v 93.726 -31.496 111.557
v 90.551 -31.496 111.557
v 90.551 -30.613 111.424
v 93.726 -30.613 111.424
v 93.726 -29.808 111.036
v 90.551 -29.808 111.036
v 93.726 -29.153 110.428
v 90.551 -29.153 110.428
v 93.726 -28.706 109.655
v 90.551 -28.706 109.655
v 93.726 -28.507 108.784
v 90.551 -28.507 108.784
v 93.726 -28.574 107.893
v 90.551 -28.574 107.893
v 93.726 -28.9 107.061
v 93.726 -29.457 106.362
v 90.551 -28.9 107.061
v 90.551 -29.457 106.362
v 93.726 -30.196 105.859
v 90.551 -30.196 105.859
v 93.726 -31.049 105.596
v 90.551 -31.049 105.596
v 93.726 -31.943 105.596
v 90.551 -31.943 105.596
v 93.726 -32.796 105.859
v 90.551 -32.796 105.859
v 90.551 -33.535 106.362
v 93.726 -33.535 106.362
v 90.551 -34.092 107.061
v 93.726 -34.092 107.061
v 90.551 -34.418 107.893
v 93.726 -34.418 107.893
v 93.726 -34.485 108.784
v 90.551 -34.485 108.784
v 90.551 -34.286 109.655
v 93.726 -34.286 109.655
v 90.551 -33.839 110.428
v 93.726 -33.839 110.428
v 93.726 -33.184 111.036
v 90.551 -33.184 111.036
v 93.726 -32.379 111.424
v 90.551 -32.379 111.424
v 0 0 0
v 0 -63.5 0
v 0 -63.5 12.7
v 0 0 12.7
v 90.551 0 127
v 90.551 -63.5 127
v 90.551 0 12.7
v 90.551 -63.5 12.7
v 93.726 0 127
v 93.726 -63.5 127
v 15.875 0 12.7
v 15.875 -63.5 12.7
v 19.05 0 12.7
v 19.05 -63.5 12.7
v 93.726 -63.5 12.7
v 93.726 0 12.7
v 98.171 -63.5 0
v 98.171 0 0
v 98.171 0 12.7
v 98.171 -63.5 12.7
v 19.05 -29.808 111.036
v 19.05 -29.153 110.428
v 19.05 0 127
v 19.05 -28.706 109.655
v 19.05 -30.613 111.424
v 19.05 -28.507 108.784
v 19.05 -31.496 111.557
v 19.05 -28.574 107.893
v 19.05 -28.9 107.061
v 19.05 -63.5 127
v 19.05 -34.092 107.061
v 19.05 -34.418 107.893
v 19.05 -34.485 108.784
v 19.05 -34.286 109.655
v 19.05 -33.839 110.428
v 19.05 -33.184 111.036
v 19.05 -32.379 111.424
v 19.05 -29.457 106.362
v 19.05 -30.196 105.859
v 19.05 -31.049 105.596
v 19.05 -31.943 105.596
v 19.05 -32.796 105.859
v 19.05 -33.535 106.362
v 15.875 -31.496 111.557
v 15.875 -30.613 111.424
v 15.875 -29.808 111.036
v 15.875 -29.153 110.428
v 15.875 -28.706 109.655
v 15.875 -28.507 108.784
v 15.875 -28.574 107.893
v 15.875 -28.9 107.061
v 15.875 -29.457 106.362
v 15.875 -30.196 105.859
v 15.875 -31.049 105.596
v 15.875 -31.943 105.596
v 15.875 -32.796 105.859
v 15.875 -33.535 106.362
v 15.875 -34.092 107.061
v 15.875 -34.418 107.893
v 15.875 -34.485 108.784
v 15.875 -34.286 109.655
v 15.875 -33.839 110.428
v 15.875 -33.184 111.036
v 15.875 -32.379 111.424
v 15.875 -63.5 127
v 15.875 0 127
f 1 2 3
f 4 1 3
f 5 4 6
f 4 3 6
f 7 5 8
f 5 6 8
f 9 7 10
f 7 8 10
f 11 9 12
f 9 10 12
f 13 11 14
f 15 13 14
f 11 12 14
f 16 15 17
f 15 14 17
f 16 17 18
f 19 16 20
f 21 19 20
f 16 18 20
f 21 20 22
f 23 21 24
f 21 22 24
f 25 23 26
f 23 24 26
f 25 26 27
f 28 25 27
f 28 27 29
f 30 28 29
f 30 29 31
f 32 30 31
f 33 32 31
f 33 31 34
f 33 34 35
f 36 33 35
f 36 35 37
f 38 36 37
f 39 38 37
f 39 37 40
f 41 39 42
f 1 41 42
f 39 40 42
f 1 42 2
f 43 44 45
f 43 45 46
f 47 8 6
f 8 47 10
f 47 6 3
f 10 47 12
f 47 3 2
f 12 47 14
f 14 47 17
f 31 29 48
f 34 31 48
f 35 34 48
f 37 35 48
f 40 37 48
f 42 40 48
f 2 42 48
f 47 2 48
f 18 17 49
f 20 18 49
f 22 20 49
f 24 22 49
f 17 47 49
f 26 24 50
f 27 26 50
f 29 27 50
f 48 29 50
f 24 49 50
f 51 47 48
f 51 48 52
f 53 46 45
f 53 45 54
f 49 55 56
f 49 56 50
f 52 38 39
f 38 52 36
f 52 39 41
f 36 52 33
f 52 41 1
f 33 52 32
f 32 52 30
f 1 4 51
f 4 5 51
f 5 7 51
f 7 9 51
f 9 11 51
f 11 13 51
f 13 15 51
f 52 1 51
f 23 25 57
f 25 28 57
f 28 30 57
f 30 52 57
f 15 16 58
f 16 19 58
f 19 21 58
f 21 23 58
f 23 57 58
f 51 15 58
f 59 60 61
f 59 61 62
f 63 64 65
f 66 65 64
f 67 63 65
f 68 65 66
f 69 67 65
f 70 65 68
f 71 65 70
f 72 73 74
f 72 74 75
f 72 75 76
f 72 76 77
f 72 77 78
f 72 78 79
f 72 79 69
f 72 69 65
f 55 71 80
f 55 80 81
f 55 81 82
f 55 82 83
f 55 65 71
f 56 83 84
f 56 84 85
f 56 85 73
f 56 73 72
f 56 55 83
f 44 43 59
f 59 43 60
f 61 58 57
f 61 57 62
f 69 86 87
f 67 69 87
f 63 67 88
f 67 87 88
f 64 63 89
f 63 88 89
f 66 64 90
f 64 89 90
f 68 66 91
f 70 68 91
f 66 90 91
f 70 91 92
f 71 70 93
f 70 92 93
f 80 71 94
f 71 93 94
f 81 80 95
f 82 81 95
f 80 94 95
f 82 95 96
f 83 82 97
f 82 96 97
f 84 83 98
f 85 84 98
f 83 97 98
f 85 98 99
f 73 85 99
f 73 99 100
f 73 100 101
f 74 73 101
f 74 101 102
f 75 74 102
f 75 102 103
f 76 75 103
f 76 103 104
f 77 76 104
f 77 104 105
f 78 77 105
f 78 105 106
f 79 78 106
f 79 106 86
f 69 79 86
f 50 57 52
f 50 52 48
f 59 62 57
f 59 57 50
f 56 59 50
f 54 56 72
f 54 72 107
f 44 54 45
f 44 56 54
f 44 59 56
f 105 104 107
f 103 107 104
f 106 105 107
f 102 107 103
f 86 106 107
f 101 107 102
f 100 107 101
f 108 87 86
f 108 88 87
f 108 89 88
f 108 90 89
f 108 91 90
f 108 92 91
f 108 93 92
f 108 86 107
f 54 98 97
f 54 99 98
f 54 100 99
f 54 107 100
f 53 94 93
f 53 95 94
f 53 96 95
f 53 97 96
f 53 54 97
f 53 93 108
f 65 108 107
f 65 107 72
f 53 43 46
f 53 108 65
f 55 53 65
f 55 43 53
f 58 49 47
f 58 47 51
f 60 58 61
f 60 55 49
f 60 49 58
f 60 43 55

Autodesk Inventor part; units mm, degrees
ref_plane "YZ Plane" through (0, 0, 0) normal (1, 0, 0) x (0, 1, 0)
ref_plane "XZ Plane" through (0, 0, 0) normal (0, 1, 0) x (-1, 0, 0)
ref_plane "XY Plane" through (0, 0, 0) normal (0, 0, 1) x (1, 0, 0)
sketch "Sketch1" plane through (0, 0, 0) normal (0, 0, 1) x (1, 0, 0)
  line L0 (0, 0) -> (98.171, 0)
  line L1 (98.171, 0) -> (98.171, -63.5)
  line L2 (98.171, -63.5) -> (0, -63.5)
  line L3 (0, -63.5) -> (0, 0)
  dimension "d0" = 98.171
  dimension "d1" = 63.5
extrude "Extrusion1" add sketch "Sketch1" along normal blind 12.7
sketch "Sketch2" plane through (0, 0, 12.7) normal (0, 0, 1) x (1, 0, 0)
  line L0 (0, -63.5) -> (98.171, -63.5) projected
  line L1 (98.171, -63.5) -> (90.551, -63.5)
  line L2 (90.551, -63.5) -> (93.726, -63.5)
  line L3 (93.726, -63.5) -> (93.726, 0)
  line L4 (93.726, 0) -> (90.551, 0)
  line L5 (90.551, 0) -> (90.551, -63.5)
  point P0 (0, 0)
  dimension "d4" = 7.62
  dimension "d5" = 3.175
extrude "Extrusion2" add sketch "Sketch2" along normal blind 114.3
sketch "Sketch3" plane through (0, 0, 12.7) normal (0, 0, 1) x (1, 0, 0)
  line L0 (0, 0) -> (15.875, 0)
  line L1 (90.551, 0) -> (0, 0) projected
  line L2 (0, -63.5) -> (90.551, -63.5) projected
  line L3 (15.875, 0) -> (19.05, 0)
  line L4 (19.05, 0) -> (19.05, -63.5)
  line L5 (19.05, -63.5) -> (15.875, -63.5)
  line L6 (15.875, -63.5) -> (15.875, 0)
  dimension "d8" = 15.875
  dimension "d9" = 3.175
extrude "Extrusion3" add sketch "Sketch3" along normal blind 114.3
sketch "Sketch4" plane through (15.875, -63.5, 12.7) normal (-1, 0, 0) x (0, 0, 1)
  circle A0 centre (95.8596, 32.004) radius 2.9972
  point P0 (-12.7, 63.5)
  point P1 (114.3, 63.5)
  dimension "d14" = 5.9944
extrude "Extrusion4" cut sketch "Sketch4" against normal blind 101.6
properties part number "ChainWheelSubAssemblyMainConnector"
